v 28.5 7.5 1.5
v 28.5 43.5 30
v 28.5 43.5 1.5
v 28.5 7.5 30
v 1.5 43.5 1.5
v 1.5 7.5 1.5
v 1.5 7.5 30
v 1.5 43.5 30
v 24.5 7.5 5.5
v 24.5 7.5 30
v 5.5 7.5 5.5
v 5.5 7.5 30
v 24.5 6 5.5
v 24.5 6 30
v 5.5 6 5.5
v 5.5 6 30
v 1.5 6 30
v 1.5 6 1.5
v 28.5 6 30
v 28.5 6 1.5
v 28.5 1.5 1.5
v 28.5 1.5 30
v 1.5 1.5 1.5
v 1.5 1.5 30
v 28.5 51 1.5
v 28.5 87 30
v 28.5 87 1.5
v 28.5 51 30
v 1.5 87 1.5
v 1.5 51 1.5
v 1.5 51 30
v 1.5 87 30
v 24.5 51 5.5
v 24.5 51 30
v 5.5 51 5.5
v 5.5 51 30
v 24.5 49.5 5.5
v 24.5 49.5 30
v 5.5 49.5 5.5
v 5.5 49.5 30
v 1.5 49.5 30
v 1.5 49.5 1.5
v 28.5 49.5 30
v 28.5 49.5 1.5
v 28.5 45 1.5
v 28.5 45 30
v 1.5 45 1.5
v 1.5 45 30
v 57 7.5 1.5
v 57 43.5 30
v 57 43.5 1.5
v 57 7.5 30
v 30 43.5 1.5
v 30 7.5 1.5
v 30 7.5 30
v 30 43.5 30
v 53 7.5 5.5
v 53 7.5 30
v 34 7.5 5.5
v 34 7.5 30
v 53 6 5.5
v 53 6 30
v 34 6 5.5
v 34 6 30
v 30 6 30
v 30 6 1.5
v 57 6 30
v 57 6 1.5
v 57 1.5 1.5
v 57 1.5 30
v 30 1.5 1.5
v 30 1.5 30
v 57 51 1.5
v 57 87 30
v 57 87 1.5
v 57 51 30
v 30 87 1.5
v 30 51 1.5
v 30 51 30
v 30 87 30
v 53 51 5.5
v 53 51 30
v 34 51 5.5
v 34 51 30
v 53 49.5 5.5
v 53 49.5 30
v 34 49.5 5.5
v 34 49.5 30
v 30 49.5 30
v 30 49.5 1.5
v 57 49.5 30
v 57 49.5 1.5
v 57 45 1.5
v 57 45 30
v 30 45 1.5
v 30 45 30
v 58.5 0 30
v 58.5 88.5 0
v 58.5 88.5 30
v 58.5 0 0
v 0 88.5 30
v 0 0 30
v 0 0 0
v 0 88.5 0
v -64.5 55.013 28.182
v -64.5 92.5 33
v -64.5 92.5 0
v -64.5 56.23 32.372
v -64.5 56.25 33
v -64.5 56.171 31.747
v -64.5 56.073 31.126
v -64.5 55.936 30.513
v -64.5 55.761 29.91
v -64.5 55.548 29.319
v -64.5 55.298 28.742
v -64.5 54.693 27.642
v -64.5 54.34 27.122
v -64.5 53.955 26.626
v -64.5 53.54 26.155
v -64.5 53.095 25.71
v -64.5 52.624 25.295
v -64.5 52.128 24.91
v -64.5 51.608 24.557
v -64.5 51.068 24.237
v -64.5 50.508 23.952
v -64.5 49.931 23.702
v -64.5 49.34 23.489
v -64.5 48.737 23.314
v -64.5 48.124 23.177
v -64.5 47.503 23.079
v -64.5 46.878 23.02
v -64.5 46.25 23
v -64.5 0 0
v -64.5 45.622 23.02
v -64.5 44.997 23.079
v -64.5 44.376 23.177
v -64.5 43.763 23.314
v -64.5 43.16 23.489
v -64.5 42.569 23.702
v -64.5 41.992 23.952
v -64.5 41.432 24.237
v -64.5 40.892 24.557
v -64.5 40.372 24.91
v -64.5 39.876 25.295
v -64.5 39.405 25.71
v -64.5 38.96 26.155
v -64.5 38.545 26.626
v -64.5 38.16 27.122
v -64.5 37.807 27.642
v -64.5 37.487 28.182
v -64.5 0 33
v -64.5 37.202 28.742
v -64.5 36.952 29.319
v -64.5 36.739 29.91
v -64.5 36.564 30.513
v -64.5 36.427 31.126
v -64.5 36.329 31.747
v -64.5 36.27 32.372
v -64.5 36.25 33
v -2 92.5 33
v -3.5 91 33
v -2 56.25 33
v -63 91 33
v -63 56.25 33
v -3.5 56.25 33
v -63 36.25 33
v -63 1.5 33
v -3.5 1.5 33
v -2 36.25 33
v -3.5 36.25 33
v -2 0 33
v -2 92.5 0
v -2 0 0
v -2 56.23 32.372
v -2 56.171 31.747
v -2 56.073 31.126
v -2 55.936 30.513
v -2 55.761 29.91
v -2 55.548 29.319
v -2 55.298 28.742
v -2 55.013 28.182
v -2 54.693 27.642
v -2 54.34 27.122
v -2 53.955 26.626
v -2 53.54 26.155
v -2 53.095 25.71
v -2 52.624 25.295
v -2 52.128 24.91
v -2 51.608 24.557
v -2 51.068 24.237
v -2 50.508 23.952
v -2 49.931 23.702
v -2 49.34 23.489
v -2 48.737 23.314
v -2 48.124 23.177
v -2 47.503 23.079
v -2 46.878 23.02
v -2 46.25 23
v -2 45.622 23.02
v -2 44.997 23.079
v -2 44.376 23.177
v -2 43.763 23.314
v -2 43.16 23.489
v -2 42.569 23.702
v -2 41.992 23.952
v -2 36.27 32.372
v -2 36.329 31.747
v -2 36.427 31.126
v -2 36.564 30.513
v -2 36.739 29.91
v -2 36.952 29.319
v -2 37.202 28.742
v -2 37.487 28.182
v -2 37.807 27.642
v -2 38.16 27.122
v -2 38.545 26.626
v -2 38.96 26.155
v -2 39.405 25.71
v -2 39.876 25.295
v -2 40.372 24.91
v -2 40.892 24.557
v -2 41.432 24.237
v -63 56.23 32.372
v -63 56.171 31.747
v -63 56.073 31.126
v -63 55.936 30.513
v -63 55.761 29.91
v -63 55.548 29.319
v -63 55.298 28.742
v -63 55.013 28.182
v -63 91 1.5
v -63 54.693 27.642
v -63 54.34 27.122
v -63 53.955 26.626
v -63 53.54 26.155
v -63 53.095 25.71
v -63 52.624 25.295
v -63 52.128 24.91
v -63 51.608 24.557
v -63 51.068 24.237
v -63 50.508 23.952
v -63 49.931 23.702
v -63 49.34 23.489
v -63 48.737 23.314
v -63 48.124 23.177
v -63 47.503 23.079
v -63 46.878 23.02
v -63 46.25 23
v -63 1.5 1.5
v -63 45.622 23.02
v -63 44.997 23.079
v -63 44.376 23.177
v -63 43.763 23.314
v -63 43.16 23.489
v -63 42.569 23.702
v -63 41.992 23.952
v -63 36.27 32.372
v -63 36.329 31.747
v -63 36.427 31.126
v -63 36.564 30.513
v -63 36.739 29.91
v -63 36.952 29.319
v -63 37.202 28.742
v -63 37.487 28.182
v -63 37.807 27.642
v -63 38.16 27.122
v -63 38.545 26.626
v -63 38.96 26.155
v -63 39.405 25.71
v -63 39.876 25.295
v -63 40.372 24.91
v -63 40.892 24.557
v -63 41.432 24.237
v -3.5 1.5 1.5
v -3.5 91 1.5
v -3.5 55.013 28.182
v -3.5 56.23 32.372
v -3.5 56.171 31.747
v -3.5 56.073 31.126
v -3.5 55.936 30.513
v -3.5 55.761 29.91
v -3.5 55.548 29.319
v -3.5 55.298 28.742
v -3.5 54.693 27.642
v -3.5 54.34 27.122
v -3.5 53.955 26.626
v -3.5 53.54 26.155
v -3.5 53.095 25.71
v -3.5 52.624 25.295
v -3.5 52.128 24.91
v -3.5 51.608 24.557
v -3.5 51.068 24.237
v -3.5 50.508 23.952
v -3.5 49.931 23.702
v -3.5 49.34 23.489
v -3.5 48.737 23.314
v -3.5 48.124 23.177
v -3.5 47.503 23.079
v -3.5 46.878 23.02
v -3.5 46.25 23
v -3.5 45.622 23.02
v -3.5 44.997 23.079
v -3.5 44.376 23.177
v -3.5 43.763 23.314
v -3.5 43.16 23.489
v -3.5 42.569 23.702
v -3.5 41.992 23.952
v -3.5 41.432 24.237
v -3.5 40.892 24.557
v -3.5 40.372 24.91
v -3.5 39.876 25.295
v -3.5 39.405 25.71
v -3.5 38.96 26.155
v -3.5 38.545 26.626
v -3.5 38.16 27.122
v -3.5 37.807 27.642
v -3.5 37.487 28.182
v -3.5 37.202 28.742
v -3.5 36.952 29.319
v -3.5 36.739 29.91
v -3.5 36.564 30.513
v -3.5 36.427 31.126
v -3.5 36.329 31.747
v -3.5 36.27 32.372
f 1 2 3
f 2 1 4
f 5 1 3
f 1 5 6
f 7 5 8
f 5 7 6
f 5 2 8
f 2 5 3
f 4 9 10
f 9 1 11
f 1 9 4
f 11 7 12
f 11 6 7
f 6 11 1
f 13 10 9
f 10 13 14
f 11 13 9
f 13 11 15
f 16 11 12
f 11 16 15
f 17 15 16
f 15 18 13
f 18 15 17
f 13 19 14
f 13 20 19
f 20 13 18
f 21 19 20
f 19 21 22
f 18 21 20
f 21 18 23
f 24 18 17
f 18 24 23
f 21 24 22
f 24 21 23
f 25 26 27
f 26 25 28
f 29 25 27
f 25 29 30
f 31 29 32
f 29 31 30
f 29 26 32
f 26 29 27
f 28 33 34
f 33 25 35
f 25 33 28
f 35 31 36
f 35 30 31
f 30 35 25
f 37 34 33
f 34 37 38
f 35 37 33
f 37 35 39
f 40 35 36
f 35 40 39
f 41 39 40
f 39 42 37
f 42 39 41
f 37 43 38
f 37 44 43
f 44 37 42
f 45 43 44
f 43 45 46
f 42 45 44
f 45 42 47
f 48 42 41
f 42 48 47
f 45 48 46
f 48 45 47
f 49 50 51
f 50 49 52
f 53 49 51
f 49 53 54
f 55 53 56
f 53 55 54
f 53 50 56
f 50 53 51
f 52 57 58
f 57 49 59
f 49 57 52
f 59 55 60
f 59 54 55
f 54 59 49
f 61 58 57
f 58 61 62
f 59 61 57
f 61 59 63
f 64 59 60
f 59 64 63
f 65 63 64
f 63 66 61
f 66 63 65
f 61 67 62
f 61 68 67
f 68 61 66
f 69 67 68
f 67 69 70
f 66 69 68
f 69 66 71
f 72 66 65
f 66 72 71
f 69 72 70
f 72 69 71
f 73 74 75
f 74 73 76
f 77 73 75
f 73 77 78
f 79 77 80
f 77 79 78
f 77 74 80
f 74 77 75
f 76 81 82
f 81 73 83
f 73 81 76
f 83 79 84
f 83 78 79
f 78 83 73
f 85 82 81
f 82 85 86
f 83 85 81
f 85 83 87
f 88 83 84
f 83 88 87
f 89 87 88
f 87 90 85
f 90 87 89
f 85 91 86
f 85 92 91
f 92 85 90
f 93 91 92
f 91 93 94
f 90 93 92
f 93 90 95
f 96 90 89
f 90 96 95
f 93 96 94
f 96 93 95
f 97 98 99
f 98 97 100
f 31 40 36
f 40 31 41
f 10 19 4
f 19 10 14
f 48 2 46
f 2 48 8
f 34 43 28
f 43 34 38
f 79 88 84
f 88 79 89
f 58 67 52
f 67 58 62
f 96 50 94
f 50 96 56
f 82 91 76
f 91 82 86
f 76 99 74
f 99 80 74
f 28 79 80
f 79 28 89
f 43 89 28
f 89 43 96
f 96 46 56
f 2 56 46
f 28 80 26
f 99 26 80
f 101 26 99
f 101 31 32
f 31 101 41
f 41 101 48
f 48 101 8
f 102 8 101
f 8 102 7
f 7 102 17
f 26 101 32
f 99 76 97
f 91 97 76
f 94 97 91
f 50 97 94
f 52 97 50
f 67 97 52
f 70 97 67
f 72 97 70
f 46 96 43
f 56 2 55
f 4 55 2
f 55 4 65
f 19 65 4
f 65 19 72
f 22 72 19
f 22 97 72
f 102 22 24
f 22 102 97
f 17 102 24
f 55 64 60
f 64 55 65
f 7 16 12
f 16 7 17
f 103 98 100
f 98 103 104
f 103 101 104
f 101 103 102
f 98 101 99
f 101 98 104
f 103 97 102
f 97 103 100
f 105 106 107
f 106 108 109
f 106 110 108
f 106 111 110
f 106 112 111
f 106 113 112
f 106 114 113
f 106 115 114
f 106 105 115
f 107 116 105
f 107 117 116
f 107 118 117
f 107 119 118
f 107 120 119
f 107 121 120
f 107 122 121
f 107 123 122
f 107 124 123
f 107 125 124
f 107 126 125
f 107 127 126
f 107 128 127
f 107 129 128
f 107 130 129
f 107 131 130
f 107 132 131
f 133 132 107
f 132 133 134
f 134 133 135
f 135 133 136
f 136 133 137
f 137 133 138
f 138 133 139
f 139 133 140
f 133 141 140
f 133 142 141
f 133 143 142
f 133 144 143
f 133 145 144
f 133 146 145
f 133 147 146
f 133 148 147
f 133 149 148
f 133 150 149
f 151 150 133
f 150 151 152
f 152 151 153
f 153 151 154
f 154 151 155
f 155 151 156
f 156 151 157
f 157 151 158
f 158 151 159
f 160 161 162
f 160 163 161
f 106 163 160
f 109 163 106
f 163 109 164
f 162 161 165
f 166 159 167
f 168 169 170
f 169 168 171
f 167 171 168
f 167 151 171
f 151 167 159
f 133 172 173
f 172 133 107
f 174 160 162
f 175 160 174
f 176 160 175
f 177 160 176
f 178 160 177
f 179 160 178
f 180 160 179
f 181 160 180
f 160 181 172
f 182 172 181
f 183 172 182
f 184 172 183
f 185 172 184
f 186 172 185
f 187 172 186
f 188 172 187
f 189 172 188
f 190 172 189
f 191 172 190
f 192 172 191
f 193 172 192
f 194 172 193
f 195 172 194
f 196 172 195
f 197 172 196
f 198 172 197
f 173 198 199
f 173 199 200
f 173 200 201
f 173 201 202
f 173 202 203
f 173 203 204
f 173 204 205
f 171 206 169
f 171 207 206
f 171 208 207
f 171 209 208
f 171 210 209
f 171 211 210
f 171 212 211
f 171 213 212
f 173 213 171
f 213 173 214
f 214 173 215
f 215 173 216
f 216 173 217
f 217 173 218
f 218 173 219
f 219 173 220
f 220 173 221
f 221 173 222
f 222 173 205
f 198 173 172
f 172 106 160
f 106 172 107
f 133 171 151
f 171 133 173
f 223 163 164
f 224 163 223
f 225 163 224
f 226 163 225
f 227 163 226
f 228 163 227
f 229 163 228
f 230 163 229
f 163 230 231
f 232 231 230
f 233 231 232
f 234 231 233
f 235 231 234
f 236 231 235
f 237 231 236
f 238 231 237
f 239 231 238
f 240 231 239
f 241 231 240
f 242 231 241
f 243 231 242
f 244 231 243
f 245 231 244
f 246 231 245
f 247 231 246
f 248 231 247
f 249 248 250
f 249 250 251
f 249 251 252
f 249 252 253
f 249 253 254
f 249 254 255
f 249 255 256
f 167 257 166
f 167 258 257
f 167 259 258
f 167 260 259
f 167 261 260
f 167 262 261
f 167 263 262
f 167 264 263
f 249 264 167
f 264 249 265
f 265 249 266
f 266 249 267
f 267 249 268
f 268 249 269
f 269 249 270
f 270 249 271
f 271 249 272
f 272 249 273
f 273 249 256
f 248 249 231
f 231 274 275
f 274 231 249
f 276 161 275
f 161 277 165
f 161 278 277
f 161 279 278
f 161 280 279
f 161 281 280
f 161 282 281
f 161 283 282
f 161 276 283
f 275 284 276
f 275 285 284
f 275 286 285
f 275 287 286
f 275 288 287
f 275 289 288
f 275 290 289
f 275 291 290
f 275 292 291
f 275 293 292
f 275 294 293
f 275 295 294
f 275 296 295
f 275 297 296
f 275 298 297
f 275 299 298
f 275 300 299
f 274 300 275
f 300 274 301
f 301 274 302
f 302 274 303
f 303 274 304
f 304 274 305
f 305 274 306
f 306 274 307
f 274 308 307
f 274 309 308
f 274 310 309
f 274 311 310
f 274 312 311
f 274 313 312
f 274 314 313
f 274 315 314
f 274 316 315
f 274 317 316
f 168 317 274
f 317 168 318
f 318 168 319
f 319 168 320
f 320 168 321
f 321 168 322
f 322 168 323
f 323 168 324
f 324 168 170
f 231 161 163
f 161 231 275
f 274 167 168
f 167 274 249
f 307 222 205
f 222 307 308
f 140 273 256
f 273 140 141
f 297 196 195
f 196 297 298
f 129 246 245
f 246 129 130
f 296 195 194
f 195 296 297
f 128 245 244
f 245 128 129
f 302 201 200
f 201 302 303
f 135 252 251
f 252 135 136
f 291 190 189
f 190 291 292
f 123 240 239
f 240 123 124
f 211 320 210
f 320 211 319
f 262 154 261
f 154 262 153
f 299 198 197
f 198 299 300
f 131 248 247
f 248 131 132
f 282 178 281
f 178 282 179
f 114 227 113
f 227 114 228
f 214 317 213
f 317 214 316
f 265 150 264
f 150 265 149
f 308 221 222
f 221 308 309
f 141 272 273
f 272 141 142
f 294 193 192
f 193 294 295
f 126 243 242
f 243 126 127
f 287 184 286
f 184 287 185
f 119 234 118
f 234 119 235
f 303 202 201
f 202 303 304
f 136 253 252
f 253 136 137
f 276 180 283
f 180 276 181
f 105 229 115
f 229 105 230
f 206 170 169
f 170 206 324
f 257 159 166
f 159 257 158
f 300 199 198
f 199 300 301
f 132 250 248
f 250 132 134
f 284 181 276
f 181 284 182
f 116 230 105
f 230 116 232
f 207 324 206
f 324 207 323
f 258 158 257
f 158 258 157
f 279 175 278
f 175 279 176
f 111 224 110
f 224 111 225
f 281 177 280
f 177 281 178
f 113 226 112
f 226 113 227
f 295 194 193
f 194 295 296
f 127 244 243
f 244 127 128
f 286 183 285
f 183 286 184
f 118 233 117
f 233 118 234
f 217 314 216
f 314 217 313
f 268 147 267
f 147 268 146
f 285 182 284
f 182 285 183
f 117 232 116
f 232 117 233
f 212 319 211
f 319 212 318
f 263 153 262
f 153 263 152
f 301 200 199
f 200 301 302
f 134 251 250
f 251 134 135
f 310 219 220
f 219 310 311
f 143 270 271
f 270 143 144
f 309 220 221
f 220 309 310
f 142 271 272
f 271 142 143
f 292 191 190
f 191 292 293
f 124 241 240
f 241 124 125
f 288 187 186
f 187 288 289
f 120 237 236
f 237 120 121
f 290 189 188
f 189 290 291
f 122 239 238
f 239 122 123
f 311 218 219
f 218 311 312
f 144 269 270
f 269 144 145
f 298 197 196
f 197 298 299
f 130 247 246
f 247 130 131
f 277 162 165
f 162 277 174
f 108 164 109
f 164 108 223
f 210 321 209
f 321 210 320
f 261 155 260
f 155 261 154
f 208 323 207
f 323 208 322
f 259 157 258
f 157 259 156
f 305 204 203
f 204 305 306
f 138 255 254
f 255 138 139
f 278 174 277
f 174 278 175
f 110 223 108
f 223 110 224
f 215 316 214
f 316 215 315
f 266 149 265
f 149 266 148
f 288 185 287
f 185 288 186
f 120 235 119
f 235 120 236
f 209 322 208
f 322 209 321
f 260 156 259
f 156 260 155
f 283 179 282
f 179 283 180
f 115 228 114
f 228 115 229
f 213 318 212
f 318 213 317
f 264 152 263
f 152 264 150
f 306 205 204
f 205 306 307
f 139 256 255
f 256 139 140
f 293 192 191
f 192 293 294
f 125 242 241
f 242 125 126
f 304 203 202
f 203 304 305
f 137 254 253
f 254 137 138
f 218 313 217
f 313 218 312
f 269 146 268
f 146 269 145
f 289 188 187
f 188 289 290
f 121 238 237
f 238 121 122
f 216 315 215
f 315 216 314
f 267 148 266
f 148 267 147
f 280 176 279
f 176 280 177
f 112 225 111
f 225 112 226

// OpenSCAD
/* [Number of slots] */

// Number in width
nb_x = 2; // [1:10]
// Number in height
nb_y = 2; // [1:10]

/* [Box parameters] */

// Thickness of walls
thickness = 1.5;

// This is the size between the cap and the box. I originally set it to 0.5, but I had to sand the walls to make it fit with the cap.
cap_box_margin = 1;

// Size of hole to put your fingers and open the box.
finger_slot = 20;

/* [Single box sizes] */

// Interior width by figurine.
width = 27;

// Interior height by figurine. This is the TOTAL height, including base. Take a little margin.
height = 42;

// Interior depth of figurine (I set it to 27, like width, as I used it for round bases)
depth = 27;

// Height of base. Remember to take some margin, or it will scratch a little, and may remove some flocking.
base_height = 4.5;

// Size of "base holder" (it will be "thickness" of thick)
interior_margin = 4;

/* [Hidden] */

// This is a single slot (removed from plain cube)
module slot()
{
    translate([0, thickness + base_height, 0])
        cube([width, height - thickness - base_height, depth + 2]);
    translate([interior_margin, base_height, interior_margin])
        cube([width - 2 * interior_margin, interior_margin, depth - interior_margin + 2]);
    cube([width, base_height, depth + 2]);
}

// This is the box which will hold the figurines.
module box()
{
    difference()
    {
        cube([(nb_x + 1) * thickness + nb_x * width, (nb_y + 1) * thickness + height * nb_y, 30]);

        for(x_decal = [0:1:nb_x - 1])
        {
            for(y_decal = [0:1:nb_y - 1])
            {
                translate([(x_decal + 1) * thickness + x_decal * width, (y_decal + 1) * thickness + y_decal * height, thickness])
                    slot();
            }
        }
    }
}

// This is the cap to close your box. I use rubberband to close.
module cap()
{
    difference()
    {
        total_width = (nb_x + 3) * thickness + nb_x * width + 1;
        total_height = (nb_y + 3) * thickness + height * nb_y + 1;
        total_depth = 30 + 2 * thickness;

        cube([total_width, total_height, total_depth]);
        translate([thickness, thickness, thickness])
            cube([(nb_x + 1) * thickness + nb_x * width + cap_box_margin, (nb_y + 1) * thickness + height * nb_y + cap_box_margin, 30 + cap_box_margin + 2 * thickness]);

        translate([-1, total_height / 2, total_depth])
            rotate([0, 90, 0])
                cylinder(d=finger_slot, h=total_width + 2, $fn=100);
    }
}

// If you need only the box, or only the cap, just remove the unneeded lines

// Renders a box.
box();

// Cap is rendered on 0.0.0 coordinates, as it is symetrical, I use mirror not to worry about width.
mirror([1, 0, 0])
    translate([2, 0, 0])
        cap();
